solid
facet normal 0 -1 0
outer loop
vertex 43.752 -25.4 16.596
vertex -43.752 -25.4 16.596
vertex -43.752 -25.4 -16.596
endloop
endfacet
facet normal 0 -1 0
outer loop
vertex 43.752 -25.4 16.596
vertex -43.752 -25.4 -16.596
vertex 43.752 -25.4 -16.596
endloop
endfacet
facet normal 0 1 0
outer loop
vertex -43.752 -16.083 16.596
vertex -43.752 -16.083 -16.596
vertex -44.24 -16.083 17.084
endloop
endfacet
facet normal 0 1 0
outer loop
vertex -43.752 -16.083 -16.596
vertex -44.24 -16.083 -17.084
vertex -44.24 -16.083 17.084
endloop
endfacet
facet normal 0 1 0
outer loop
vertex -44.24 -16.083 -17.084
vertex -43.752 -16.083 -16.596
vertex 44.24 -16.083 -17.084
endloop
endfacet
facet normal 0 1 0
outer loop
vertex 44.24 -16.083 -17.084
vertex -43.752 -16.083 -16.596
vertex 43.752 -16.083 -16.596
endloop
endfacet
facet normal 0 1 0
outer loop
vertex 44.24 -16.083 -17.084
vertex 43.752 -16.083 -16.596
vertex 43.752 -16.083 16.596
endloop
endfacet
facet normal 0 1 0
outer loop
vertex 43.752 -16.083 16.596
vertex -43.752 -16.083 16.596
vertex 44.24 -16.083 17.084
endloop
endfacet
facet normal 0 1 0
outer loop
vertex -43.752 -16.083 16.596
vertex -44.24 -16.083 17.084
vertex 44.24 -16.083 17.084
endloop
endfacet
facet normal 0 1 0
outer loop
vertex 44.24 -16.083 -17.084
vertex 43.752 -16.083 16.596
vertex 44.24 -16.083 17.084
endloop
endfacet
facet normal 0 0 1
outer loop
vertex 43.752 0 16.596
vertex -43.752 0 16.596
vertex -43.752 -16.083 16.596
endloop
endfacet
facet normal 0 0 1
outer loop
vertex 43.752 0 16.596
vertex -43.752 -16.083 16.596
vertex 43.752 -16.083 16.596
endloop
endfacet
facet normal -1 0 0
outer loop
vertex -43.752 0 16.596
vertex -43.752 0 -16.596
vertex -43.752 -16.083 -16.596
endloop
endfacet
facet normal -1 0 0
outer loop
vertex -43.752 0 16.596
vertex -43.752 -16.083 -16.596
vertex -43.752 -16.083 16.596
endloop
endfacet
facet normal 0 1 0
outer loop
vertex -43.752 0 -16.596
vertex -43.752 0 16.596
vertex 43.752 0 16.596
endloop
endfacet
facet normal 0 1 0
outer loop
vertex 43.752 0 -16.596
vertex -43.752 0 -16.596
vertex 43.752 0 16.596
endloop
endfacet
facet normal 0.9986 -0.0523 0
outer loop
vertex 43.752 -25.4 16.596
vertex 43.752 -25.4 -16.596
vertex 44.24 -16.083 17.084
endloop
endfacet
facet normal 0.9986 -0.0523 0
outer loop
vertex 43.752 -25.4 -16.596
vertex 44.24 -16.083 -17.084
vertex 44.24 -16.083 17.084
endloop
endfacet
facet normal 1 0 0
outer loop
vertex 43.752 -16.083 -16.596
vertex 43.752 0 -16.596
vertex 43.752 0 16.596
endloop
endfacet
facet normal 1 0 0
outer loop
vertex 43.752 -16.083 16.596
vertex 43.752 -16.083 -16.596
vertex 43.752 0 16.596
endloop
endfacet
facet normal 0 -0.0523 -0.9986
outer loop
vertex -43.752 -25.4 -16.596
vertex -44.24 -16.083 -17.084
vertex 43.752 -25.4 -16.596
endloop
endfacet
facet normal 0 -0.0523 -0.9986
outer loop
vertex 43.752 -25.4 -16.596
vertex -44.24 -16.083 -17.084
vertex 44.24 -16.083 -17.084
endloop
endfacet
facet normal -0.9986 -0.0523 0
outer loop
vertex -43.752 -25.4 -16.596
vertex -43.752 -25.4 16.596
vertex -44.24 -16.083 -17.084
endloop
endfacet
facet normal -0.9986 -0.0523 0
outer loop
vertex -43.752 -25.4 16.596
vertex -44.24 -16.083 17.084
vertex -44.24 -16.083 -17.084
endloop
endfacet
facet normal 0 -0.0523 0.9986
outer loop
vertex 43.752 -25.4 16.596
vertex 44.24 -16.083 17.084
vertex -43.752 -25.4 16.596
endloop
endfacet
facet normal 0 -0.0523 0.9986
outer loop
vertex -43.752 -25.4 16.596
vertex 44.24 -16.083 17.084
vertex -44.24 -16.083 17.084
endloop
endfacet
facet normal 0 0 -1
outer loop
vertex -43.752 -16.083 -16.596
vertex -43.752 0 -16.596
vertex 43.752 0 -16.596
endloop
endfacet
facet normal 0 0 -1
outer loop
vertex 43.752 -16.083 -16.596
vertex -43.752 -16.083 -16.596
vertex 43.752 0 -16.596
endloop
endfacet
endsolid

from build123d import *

# Parameters (mm, degrees)
F0_W      = 87.5036269426
F0_H      = 33.1910848618
F1_DEPTH  = 25.4
F1_FACE_W = 87.5036269426
F1_FACE_H = 33.1910848618
F2_DEPTH  = 9.3165077269
F2_TAPER  = -3


with BuildPart() as f1:
    # F0 (on Front) → F1 (new body)
    with BuildSketch(Plane.XZ):
        Rectangle(F0_W, F0_H)
    extrude(amount=F1_DEPTH)

    # F1_face (on face) → F2 (join)
    with BuildSketch(Plane.XZ.offset(25.4)):
        Rectangle(F1_FACE_W, F1_FACE_H)
    extrude(amount=-F2_DEPTH, taper=F2_TAPER)


solid = f1.part
